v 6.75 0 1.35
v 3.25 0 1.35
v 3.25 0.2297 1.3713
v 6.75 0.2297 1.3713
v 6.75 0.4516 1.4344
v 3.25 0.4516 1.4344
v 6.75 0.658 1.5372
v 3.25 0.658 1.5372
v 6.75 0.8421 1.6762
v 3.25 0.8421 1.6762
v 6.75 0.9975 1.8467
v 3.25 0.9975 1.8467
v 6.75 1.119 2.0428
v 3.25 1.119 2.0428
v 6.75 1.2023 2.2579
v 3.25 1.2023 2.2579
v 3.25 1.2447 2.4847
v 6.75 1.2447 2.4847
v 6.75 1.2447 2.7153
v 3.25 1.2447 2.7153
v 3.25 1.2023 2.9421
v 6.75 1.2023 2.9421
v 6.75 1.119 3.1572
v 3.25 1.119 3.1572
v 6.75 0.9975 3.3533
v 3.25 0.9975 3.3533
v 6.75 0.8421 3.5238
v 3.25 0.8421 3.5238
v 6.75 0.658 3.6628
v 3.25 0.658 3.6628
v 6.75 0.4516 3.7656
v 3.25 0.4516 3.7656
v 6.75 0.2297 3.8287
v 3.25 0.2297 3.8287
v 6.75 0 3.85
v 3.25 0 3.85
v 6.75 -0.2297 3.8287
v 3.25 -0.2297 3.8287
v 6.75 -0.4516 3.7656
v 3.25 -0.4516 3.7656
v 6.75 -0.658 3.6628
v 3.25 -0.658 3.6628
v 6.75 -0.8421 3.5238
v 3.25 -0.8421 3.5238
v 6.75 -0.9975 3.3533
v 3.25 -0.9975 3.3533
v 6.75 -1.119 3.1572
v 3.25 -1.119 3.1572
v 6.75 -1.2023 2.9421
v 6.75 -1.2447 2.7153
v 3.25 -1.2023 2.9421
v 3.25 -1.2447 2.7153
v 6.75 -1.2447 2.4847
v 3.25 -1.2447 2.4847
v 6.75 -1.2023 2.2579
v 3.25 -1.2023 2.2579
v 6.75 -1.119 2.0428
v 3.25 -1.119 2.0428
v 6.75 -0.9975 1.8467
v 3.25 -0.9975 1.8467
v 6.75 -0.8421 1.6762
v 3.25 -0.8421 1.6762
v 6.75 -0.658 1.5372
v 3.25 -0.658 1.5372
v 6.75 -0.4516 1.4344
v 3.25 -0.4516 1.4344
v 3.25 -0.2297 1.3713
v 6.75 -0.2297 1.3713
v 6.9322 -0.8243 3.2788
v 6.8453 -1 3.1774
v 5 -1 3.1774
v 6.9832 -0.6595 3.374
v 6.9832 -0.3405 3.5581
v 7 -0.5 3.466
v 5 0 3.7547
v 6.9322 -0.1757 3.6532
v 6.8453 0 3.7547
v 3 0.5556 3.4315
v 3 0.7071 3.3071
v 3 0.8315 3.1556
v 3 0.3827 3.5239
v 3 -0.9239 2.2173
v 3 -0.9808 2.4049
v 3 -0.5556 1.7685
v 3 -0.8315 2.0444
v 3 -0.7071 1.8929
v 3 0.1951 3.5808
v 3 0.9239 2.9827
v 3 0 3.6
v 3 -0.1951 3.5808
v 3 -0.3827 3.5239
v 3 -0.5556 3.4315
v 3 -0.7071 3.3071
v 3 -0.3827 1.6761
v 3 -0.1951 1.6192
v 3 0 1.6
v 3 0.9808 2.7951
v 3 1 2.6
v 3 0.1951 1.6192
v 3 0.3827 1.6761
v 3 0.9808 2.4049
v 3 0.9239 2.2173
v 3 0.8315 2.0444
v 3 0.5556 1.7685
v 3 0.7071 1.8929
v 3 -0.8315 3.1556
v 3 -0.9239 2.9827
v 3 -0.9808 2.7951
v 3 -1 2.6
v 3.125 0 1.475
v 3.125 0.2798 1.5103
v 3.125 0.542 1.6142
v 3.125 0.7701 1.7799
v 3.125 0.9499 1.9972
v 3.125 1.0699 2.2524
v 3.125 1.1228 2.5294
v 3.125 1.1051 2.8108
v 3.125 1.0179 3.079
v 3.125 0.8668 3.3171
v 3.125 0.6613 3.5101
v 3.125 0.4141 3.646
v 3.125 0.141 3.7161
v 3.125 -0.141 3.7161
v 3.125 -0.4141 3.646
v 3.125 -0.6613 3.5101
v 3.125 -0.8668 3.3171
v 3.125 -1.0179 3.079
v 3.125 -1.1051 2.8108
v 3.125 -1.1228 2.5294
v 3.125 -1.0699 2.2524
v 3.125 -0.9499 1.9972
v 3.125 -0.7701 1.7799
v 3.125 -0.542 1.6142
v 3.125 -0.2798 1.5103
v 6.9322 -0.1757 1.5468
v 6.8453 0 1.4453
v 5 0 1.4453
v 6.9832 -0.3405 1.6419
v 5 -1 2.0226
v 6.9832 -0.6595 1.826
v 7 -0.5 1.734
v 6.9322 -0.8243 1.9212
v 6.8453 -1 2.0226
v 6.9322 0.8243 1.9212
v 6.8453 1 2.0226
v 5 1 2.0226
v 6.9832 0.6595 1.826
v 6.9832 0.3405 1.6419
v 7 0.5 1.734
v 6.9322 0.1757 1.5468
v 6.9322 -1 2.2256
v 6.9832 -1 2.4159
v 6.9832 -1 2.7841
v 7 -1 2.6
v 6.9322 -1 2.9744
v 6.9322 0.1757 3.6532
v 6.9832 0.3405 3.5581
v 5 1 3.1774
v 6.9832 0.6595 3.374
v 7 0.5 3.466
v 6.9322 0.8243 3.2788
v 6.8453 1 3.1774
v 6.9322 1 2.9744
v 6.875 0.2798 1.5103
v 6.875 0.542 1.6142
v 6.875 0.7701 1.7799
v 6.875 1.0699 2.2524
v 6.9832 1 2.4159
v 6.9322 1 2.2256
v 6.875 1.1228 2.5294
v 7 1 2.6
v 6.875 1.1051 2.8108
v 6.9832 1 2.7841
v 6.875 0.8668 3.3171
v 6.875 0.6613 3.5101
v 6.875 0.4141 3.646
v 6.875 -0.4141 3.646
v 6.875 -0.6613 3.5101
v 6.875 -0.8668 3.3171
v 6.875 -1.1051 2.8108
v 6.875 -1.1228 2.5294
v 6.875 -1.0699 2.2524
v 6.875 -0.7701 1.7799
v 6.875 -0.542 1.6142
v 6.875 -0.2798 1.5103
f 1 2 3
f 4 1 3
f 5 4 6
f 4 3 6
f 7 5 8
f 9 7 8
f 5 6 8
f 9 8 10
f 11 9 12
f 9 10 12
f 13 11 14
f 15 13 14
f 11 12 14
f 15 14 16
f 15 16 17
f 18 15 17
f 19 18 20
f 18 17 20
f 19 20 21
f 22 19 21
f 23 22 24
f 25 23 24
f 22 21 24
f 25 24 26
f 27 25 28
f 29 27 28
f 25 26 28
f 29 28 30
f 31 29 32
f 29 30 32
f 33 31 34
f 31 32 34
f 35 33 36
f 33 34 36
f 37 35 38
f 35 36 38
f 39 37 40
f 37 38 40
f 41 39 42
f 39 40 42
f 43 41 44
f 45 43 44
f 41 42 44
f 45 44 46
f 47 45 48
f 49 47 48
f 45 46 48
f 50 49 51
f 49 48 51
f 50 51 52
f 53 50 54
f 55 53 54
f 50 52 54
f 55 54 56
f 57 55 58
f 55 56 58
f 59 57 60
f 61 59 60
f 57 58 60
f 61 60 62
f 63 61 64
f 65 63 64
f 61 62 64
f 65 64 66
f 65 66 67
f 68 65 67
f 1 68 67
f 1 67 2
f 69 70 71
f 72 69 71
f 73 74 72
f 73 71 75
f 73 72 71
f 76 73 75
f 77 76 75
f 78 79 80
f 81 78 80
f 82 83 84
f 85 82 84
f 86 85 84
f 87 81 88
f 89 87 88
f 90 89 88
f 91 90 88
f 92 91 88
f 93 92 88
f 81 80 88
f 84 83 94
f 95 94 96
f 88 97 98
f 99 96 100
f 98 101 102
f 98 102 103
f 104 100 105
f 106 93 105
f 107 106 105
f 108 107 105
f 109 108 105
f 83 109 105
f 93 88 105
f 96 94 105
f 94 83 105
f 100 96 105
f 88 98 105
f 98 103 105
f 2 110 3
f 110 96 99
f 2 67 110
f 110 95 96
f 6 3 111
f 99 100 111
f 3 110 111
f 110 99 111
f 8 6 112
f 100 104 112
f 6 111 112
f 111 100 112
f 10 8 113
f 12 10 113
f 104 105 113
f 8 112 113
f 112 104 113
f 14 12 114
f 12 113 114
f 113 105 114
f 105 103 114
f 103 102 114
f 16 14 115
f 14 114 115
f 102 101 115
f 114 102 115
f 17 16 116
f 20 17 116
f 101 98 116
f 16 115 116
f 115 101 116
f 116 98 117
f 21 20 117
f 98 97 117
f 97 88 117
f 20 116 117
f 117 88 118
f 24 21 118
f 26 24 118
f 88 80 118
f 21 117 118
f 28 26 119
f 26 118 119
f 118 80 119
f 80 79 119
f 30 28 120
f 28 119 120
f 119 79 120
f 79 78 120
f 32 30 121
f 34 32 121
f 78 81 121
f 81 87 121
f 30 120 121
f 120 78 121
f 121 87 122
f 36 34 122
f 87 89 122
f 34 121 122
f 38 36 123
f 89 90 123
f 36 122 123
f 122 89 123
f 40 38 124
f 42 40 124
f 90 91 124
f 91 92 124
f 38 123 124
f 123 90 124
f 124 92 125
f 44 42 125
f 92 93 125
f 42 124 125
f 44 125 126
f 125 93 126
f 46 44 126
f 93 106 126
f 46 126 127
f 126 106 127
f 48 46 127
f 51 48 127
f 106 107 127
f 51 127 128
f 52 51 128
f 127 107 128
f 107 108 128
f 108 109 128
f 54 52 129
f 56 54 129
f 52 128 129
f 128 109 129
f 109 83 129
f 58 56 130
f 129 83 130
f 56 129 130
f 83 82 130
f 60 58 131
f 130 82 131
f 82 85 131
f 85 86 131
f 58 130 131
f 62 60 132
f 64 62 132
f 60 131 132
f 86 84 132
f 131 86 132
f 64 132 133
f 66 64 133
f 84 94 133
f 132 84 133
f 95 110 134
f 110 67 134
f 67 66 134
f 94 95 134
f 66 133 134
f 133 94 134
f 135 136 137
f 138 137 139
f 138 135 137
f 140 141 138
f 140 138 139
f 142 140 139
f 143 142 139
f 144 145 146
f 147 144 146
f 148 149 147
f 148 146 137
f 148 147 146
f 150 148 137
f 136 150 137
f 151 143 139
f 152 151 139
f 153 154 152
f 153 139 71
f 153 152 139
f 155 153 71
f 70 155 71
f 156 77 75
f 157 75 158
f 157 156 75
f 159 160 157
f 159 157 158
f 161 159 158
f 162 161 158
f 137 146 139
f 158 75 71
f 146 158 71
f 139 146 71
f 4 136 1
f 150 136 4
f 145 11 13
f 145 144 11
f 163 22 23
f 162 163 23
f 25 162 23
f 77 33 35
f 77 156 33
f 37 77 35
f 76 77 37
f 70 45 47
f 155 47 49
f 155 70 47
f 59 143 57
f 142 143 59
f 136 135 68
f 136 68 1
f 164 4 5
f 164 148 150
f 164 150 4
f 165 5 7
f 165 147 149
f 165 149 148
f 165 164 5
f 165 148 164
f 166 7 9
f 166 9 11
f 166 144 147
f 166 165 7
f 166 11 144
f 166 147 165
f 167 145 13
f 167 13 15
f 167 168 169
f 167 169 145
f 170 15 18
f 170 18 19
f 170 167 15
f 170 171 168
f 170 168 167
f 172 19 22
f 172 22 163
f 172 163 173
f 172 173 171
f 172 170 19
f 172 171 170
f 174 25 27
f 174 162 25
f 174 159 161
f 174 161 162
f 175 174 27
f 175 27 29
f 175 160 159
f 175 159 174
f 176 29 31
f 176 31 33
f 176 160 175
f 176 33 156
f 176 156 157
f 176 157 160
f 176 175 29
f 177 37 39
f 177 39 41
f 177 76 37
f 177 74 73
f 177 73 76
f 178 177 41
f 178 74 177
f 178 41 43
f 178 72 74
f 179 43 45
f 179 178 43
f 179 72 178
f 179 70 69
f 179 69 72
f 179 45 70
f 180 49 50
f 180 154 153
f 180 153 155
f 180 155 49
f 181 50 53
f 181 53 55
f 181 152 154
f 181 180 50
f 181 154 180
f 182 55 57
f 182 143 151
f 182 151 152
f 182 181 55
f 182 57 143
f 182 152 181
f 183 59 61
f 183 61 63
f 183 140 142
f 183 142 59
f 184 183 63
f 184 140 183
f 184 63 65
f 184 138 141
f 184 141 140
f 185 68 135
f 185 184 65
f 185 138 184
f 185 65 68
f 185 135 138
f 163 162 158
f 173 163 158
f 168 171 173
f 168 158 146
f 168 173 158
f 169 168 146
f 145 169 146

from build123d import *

# Parameters (mm, degrees)
CYLINDER001_R           = 1.25
CYLINDER001_DEPTH       = 4
CYLINDER001_PITCH_ANGLE = 90
CHAMFER_SIZE            = 0.25
POCKET_DEPTH            = 2


with BuildPart() as part:
    # Cylinder001 → Cylinder001 (new body)
    with BuildSketch(Plane.XY):
        Circle(CYLINDER001_R)
    extrude(amount=CYLINDER001_DEPTH)


with BuildPart() as part_1:
    # Cylinder001 pitch: moved
    add(part.part.rotate(Axis((0, 0, 0), (0, 1, 0)), CYLINDER001_PITCH_ANGLE))


with BuildPart() as part_2:
    # Cylinder001 placement: moved
    add(part_1.part.moved(Location((3, 0, 2.6))))

    # Chamfer
    chamfer_edges = [part_2.edges().sort_by_distance(p)[0] for p in [
        (7, 0, 3.85),
        (3, 0, 3.85),
    ]]
    chamfer(chamfer_edges, length=CHAMFER_SIZE)

    # Sketch001 → Pocket (cut)
    with BuildSketch(Plane.YZ.offset(7)):
        Polygon((-1, 3.17735), (0, 3.754701), (1, 3.17735), (1, 2.02265), (0, 1.445299), (-1, 2.02265), align=None)
    extrude(amount=-POCKET_DEPTH, mode=Mode.SUBTRACT)


solid = part_2.part
